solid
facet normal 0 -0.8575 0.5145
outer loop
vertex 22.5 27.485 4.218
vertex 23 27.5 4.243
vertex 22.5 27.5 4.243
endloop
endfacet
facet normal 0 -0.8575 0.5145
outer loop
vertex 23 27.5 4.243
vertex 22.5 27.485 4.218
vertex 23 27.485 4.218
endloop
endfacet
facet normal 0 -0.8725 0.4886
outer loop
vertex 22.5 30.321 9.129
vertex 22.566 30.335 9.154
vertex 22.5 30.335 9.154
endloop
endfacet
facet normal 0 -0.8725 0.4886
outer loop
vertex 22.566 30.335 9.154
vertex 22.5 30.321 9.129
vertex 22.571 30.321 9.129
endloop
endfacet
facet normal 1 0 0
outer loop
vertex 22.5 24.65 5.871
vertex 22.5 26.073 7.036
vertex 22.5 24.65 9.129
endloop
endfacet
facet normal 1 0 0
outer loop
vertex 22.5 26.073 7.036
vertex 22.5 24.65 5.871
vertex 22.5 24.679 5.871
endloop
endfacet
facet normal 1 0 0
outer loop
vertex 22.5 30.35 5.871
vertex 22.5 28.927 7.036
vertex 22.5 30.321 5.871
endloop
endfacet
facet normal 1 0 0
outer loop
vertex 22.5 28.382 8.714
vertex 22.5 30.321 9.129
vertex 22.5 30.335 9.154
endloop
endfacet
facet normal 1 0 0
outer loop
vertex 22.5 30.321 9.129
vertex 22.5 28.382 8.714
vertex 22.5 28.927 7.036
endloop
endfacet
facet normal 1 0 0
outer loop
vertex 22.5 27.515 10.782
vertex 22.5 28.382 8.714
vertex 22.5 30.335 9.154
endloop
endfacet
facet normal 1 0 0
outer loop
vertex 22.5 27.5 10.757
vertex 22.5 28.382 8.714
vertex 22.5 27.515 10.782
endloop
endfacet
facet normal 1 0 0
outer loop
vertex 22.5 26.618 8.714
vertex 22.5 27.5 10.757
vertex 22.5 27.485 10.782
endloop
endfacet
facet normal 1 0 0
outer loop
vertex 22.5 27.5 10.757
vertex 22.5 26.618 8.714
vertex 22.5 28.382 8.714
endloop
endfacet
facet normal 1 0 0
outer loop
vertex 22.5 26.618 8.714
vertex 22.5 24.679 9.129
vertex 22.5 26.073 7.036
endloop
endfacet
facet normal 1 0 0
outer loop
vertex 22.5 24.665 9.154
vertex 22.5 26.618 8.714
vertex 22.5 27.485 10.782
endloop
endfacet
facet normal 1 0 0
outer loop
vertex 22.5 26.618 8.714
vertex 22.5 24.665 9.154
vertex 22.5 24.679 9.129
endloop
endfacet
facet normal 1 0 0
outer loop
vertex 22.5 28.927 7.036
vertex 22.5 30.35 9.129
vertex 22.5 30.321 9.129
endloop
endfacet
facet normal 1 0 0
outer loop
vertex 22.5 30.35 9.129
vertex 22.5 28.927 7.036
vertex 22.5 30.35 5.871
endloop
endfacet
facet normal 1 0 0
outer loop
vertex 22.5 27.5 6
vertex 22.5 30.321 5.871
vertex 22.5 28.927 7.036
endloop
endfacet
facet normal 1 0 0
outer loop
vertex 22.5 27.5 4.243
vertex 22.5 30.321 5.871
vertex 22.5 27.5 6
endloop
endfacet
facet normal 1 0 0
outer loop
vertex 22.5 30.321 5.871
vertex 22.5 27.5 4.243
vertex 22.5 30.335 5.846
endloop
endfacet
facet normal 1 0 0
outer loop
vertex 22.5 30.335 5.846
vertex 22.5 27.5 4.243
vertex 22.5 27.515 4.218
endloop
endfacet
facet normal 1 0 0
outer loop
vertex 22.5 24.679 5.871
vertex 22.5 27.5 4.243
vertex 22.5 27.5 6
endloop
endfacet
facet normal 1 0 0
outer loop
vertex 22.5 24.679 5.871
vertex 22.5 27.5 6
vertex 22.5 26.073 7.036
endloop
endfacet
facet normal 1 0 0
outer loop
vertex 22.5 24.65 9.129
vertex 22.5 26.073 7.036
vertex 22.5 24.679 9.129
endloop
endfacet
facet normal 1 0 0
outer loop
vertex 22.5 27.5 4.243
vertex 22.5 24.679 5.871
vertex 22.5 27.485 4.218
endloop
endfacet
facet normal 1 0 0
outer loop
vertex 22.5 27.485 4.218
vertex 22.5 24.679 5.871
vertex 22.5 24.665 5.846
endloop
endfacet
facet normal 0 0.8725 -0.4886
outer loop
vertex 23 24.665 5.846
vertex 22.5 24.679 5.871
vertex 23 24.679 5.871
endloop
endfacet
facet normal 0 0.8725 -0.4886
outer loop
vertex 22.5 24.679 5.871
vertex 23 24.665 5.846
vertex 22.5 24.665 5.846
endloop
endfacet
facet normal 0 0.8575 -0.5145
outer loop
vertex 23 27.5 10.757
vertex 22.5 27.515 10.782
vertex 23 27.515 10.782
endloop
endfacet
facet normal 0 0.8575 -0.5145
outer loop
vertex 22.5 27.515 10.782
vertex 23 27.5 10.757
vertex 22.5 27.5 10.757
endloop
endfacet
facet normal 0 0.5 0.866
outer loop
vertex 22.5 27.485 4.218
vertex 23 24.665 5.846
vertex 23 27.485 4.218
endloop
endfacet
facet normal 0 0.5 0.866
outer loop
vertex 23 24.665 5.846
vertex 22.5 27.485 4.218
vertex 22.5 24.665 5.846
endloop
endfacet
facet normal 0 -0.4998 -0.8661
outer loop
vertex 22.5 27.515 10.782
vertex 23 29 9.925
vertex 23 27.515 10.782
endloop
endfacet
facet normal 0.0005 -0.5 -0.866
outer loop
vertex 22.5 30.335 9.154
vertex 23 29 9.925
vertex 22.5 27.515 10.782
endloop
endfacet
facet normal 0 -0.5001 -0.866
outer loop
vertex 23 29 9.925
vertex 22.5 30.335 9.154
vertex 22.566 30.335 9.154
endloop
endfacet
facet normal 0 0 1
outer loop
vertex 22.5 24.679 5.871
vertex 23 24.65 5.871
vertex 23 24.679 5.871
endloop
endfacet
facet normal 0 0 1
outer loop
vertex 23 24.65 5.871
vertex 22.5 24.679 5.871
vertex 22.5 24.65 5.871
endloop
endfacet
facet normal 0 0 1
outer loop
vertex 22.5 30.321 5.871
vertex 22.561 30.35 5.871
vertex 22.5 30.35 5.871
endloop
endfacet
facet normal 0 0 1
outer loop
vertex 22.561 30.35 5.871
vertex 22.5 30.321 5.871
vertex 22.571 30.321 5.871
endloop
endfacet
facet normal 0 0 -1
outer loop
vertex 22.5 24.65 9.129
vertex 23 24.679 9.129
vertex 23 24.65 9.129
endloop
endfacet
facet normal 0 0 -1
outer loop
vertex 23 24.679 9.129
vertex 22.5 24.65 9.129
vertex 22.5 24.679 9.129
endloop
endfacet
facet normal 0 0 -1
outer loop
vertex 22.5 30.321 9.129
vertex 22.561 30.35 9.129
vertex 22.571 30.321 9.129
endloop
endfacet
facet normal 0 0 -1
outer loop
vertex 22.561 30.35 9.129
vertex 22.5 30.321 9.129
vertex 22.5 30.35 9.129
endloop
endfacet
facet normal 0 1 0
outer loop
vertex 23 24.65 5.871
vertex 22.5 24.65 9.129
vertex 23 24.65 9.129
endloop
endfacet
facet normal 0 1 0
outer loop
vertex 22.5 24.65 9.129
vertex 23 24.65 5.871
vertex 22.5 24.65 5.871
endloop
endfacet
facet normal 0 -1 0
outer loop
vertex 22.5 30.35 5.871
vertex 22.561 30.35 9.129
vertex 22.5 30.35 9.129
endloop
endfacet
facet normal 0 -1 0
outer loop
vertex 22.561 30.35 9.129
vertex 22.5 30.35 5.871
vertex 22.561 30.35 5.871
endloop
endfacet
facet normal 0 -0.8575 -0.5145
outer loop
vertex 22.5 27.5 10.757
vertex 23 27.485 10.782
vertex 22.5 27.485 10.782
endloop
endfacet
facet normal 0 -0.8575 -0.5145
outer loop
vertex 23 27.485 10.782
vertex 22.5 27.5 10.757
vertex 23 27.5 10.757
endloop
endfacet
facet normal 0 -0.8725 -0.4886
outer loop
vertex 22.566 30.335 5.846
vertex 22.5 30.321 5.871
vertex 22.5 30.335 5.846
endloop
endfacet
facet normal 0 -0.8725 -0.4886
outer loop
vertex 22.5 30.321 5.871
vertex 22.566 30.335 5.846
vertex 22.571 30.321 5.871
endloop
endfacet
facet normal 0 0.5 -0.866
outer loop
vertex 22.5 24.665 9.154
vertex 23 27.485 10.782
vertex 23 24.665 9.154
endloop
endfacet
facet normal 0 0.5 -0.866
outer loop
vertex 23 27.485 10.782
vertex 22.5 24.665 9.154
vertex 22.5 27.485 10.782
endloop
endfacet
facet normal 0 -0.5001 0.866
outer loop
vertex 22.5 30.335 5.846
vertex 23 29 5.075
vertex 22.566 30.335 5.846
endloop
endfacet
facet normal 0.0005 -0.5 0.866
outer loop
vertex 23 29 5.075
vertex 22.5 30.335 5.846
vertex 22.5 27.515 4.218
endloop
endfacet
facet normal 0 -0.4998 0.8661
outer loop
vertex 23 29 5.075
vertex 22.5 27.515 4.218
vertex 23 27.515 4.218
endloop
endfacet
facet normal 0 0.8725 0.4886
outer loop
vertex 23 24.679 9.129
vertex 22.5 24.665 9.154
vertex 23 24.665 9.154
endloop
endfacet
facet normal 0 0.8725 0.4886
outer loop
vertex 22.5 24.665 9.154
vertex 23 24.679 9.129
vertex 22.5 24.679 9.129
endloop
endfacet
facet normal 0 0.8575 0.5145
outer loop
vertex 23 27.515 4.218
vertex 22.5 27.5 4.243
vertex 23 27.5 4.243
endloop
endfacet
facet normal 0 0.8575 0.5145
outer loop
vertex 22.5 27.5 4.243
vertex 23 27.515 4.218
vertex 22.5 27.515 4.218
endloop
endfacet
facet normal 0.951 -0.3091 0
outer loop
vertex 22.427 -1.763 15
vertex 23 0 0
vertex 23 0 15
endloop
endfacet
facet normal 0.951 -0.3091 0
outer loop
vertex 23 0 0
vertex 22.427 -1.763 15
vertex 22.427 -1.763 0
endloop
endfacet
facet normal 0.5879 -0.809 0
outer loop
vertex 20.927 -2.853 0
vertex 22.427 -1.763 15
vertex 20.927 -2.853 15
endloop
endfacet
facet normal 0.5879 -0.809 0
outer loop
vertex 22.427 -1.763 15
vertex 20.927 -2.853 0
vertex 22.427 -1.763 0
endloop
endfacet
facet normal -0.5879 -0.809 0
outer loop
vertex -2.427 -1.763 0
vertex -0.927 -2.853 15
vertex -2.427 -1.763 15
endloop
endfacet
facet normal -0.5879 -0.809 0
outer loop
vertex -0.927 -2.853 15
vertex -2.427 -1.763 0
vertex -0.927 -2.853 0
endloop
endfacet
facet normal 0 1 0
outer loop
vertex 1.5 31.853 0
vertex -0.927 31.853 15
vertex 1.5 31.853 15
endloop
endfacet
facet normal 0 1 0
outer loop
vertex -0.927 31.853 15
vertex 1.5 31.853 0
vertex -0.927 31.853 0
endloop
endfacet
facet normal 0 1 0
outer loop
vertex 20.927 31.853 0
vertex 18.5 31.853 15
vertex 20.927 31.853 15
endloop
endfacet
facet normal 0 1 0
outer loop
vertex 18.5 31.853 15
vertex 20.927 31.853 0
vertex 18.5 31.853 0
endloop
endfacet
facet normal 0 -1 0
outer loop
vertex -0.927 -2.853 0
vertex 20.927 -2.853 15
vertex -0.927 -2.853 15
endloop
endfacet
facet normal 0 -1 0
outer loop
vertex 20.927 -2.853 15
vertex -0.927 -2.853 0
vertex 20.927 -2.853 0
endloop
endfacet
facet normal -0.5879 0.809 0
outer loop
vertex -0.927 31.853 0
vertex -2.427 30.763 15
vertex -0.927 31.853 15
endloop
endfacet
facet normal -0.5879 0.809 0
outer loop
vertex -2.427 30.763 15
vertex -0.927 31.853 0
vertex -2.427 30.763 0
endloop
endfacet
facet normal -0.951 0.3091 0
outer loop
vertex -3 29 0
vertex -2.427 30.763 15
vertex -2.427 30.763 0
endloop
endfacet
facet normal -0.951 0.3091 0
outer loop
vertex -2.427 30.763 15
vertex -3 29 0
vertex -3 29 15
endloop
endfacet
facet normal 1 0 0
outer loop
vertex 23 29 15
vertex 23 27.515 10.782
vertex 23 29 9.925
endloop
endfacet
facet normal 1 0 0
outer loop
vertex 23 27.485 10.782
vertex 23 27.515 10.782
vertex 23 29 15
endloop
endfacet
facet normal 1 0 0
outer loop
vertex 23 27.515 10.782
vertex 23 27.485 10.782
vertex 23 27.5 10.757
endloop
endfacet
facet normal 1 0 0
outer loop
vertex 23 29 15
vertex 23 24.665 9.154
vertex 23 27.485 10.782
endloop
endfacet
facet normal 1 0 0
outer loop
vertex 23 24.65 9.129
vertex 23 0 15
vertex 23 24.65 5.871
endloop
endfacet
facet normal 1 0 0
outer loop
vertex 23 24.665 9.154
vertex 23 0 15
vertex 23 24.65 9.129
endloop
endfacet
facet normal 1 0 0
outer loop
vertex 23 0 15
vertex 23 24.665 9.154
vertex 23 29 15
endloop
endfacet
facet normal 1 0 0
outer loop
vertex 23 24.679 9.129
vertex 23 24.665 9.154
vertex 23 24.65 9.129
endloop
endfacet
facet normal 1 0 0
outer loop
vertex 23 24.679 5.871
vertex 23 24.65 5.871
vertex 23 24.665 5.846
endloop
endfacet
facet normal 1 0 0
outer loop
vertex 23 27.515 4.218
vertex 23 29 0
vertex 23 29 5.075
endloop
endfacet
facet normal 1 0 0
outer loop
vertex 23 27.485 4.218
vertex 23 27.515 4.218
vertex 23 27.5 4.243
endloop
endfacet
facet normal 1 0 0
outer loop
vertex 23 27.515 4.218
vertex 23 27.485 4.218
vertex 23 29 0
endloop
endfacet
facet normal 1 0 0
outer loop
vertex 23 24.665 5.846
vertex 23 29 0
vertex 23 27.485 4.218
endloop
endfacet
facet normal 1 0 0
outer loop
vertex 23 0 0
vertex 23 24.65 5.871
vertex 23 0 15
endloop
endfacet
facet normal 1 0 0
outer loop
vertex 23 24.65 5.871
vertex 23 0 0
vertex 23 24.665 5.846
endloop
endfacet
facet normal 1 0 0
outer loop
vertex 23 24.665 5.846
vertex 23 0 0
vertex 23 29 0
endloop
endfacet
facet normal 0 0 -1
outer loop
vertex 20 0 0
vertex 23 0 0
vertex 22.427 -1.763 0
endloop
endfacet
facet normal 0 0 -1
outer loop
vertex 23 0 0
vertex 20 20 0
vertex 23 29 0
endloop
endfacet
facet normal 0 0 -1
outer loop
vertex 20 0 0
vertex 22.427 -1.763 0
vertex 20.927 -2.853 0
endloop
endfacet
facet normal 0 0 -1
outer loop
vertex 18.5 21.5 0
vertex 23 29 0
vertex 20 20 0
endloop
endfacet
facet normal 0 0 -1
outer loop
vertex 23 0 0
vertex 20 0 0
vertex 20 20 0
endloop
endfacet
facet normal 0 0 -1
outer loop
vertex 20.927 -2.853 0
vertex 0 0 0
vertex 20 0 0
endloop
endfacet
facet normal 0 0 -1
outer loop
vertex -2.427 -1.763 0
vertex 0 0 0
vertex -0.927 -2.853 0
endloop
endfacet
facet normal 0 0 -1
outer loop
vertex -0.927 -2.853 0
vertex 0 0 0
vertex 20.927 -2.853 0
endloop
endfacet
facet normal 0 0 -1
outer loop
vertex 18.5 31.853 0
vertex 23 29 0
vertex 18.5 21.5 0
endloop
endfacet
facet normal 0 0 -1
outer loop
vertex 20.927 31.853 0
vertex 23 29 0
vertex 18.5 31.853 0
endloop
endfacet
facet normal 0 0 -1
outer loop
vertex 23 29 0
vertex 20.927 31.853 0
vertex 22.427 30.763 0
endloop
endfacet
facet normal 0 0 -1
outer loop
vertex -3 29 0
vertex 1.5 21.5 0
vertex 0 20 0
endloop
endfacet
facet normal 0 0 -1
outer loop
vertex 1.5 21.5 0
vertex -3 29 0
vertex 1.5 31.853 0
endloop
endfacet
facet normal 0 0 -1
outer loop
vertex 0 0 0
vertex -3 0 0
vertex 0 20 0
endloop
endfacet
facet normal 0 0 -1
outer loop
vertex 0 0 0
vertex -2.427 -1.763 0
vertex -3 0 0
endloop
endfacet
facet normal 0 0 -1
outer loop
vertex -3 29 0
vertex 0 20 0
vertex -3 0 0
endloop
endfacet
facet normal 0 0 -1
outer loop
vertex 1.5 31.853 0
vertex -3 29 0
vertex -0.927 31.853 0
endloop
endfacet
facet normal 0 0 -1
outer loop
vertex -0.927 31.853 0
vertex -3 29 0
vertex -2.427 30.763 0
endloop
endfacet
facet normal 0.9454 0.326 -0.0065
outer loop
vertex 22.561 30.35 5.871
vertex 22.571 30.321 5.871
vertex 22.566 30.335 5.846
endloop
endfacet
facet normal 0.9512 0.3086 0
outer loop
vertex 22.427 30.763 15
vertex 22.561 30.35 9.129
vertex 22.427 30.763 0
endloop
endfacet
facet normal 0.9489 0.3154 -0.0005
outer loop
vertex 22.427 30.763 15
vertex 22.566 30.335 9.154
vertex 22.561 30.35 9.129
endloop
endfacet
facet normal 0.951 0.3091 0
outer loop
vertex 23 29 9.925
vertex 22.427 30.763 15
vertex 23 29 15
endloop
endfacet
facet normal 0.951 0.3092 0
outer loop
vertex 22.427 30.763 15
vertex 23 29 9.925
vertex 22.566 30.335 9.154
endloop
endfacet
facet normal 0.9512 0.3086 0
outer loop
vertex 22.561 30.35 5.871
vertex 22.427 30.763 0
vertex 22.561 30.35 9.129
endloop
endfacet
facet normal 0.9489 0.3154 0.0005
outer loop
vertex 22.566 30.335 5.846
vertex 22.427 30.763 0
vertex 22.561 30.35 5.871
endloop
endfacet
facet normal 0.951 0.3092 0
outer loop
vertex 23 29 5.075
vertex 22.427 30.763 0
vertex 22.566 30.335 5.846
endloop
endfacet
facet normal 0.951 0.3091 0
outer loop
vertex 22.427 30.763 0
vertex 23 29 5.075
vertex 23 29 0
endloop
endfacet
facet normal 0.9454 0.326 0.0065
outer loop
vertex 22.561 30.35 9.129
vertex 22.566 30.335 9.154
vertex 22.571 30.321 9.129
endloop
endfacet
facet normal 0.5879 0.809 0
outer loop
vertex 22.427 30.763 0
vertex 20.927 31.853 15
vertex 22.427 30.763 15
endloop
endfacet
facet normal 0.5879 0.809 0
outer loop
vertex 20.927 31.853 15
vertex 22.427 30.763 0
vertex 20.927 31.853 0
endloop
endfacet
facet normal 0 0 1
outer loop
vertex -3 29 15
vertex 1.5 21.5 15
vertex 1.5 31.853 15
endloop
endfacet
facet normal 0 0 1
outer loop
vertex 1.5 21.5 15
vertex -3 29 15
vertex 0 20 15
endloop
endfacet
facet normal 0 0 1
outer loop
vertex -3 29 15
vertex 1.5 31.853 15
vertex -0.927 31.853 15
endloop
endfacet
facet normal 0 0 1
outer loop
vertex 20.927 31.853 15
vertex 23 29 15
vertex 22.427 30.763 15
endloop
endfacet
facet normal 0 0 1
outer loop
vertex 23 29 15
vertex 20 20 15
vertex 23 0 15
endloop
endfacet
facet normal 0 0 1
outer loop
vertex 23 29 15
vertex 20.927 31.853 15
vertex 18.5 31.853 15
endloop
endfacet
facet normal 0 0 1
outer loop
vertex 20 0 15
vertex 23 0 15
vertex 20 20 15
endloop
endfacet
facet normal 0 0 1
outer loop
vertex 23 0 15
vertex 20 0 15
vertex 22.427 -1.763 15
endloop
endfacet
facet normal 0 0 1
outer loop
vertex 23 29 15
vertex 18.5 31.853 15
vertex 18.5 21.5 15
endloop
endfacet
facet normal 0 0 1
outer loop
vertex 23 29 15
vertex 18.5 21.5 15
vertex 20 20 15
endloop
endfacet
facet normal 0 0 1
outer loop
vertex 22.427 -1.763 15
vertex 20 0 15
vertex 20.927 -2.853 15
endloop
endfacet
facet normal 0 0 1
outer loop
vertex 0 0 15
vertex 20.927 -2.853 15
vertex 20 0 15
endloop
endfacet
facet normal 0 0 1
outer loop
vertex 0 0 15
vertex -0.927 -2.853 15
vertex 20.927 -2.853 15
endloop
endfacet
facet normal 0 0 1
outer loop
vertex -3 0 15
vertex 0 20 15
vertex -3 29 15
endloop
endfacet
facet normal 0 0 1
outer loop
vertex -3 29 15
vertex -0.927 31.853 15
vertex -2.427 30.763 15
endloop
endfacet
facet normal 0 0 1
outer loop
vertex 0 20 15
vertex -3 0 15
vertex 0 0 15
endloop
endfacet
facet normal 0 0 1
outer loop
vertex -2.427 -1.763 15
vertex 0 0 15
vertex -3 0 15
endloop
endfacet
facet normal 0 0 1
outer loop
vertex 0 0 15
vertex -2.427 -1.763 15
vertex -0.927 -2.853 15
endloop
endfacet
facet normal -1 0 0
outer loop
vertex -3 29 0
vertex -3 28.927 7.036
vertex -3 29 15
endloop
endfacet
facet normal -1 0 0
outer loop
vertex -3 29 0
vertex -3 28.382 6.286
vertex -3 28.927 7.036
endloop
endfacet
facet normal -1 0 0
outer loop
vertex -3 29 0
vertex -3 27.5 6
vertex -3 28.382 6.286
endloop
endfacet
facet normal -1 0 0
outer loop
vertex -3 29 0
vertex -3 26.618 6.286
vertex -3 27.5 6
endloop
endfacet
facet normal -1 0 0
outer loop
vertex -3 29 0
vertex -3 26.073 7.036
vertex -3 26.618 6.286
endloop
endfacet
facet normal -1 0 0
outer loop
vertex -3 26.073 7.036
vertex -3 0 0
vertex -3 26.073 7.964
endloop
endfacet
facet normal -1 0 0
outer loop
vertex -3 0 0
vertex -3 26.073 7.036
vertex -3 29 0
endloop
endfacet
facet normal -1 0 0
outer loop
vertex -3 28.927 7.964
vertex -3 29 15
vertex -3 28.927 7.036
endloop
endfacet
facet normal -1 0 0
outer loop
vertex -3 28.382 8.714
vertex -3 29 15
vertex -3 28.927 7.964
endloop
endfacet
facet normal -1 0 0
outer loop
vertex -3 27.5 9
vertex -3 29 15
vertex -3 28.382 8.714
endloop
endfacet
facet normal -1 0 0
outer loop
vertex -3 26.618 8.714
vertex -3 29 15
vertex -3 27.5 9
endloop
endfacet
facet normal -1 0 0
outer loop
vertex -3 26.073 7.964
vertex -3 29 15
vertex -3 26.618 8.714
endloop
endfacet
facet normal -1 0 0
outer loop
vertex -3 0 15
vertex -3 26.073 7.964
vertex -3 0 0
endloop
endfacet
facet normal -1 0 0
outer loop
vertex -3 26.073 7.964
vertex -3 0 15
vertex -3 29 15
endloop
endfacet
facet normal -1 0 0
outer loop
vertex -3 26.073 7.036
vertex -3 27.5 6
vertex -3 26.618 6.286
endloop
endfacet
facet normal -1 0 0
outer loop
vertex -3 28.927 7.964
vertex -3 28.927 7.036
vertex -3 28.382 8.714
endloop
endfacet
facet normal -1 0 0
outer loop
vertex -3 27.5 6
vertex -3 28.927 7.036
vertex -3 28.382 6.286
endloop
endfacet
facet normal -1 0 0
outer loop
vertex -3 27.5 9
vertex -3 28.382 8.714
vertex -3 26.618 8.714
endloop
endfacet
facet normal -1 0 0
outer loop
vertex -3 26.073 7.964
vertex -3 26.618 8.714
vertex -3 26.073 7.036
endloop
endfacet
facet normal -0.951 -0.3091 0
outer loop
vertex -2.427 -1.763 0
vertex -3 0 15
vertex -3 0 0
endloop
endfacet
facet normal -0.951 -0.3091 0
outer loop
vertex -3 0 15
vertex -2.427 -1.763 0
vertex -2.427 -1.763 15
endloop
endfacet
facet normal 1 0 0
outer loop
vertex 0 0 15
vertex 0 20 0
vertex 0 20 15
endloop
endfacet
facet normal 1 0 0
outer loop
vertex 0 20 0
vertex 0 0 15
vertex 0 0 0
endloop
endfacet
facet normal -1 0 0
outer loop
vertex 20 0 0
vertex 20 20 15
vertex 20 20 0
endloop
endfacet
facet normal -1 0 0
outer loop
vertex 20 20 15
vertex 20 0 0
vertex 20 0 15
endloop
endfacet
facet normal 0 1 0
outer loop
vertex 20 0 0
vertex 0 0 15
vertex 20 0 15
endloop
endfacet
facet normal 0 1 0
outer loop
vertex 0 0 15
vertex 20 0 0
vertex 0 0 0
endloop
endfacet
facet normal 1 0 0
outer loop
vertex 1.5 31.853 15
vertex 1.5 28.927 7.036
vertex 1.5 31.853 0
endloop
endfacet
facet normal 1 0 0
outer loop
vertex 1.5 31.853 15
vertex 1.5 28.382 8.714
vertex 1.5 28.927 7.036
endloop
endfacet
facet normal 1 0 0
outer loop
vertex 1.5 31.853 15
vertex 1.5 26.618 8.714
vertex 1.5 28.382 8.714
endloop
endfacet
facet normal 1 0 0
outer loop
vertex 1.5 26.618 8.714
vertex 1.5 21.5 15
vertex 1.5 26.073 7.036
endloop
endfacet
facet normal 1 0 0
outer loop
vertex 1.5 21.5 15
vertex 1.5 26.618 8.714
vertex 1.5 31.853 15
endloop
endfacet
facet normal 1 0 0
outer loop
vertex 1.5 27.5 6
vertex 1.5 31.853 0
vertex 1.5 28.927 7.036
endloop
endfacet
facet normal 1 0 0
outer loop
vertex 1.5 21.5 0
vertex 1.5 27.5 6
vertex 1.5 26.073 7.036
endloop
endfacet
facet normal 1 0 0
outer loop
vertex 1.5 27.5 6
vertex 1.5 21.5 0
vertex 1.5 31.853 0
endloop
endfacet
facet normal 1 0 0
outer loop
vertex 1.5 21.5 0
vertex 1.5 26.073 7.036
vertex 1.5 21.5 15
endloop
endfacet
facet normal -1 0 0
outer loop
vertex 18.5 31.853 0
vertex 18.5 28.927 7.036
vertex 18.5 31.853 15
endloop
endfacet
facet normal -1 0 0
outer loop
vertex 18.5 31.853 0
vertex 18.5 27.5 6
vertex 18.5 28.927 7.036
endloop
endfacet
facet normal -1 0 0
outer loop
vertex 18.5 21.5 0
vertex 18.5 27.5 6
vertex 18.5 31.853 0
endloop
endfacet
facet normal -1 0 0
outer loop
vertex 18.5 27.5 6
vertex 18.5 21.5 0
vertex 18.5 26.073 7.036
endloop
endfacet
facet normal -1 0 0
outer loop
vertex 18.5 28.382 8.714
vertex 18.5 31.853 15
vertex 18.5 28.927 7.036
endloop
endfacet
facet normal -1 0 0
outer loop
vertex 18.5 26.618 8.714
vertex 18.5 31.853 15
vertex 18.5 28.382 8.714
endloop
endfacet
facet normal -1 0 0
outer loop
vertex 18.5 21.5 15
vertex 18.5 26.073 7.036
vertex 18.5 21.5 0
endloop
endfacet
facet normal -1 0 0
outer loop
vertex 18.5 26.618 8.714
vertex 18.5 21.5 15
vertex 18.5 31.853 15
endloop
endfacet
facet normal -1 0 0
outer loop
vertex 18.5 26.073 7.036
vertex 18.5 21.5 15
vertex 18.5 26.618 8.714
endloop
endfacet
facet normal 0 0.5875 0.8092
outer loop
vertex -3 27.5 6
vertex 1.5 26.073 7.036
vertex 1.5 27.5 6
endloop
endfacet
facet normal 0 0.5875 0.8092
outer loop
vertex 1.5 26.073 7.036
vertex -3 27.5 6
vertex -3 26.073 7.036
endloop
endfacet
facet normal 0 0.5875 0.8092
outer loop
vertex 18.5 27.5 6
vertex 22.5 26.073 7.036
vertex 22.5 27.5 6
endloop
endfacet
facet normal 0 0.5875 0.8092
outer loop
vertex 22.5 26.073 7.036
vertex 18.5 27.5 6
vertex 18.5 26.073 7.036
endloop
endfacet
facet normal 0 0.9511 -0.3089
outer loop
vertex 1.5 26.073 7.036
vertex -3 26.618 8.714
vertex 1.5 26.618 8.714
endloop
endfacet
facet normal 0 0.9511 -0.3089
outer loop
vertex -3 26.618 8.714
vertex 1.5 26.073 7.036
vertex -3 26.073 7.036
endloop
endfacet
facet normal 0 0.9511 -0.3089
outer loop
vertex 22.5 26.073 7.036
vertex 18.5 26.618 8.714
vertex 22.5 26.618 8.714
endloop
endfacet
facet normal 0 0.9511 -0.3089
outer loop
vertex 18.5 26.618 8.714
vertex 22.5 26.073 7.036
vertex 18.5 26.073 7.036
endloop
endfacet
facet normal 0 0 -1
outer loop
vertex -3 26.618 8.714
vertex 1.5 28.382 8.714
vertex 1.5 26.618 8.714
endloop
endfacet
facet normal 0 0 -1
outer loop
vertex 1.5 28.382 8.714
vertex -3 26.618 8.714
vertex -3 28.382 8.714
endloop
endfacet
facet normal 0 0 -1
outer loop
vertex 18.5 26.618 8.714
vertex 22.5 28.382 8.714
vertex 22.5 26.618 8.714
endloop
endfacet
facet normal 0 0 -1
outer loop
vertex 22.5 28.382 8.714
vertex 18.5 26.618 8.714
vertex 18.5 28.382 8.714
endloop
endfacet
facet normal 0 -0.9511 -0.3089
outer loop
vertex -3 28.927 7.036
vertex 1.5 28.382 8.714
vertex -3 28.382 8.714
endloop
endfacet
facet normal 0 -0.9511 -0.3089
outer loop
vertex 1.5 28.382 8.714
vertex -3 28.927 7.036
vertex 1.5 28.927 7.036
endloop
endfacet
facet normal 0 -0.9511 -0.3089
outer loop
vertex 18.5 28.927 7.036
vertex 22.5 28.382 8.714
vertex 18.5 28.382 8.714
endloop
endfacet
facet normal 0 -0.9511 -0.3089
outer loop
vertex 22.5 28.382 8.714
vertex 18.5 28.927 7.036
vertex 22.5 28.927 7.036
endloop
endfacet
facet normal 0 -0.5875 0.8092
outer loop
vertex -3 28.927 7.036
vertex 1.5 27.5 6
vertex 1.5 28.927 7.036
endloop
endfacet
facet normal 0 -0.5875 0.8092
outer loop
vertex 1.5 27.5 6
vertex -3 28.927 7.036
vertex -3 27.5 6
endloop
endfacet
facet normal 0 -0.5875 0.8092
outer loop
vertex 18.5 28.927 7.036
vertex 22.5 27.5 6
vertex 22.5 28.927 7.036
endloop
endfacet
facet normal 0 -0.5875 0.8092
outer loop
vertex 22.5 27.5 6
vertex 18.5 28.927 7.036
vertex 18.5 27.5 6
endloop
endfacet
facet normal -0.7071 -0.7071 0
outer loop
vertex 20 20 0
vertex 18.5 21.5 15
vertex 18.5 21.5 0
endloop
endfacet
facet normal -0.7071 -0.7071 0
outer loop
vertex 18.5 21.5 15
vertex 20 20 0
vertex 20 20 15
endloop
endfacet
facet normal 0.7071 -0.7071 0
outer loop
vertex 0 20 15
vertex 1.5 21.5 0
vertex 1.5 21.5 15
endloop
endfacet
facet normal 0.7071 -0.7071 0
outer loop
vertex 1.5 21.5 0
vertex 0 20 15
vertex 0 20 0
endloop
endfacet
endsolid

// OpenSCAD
width = 15;
outer_hole_dia = 5;
expanded_part_width = 16;

// size is the XY plane size, height in Z
module hexagon(size, height) {
  boxWidth = size/1.75;
  for (r = [-60, 0, 60]) rotate([0,0,r]) cube([boxWidth, size, height], true);
}

module extrusion_mount() {

translate([20,20,0])
rotate([0,0,180])

difference() {

union() {

translate([0, -9, 0])
minkowski()
{
   cube([20,29,width-1]);
   cylinder(r=3,h=1);
}

}

// hole for main extrusion
   translate([0, 0, -1])
   cube([20,20,22]);

// for screw part
   translate([1.5, -16, -1])
   cube([17,20,22]);


// screw holes

translate([-4,-7.5, width/2])
rotate(a=90, v=[0,1,0])
hexagon(5.7, 3);

translate([23,-7.5, width/2])
rotate(a=90, v=[0,1,0])
cylinder(r2=3, r1=1.5, h=3);

translate([-10,-7.5, width/2])
rotate(a=90, v=[0,1,0])
cylinder(r=1.5, h=40);

// 45 degrees taper
translate([0,0,-1])
linear_extrude(height = width + 2)
polygon(points=[[0,0],[3,0],[3,-3]], paths=[[0,1,2]]);

translate([20,0,-1])
linear_extrude(height = width + 2)
polygon(points=[[-3,0],[0,0],[-3,-3]], paths=[[0,1,2]]);

}

}

//holder();

extrusion_mount();
